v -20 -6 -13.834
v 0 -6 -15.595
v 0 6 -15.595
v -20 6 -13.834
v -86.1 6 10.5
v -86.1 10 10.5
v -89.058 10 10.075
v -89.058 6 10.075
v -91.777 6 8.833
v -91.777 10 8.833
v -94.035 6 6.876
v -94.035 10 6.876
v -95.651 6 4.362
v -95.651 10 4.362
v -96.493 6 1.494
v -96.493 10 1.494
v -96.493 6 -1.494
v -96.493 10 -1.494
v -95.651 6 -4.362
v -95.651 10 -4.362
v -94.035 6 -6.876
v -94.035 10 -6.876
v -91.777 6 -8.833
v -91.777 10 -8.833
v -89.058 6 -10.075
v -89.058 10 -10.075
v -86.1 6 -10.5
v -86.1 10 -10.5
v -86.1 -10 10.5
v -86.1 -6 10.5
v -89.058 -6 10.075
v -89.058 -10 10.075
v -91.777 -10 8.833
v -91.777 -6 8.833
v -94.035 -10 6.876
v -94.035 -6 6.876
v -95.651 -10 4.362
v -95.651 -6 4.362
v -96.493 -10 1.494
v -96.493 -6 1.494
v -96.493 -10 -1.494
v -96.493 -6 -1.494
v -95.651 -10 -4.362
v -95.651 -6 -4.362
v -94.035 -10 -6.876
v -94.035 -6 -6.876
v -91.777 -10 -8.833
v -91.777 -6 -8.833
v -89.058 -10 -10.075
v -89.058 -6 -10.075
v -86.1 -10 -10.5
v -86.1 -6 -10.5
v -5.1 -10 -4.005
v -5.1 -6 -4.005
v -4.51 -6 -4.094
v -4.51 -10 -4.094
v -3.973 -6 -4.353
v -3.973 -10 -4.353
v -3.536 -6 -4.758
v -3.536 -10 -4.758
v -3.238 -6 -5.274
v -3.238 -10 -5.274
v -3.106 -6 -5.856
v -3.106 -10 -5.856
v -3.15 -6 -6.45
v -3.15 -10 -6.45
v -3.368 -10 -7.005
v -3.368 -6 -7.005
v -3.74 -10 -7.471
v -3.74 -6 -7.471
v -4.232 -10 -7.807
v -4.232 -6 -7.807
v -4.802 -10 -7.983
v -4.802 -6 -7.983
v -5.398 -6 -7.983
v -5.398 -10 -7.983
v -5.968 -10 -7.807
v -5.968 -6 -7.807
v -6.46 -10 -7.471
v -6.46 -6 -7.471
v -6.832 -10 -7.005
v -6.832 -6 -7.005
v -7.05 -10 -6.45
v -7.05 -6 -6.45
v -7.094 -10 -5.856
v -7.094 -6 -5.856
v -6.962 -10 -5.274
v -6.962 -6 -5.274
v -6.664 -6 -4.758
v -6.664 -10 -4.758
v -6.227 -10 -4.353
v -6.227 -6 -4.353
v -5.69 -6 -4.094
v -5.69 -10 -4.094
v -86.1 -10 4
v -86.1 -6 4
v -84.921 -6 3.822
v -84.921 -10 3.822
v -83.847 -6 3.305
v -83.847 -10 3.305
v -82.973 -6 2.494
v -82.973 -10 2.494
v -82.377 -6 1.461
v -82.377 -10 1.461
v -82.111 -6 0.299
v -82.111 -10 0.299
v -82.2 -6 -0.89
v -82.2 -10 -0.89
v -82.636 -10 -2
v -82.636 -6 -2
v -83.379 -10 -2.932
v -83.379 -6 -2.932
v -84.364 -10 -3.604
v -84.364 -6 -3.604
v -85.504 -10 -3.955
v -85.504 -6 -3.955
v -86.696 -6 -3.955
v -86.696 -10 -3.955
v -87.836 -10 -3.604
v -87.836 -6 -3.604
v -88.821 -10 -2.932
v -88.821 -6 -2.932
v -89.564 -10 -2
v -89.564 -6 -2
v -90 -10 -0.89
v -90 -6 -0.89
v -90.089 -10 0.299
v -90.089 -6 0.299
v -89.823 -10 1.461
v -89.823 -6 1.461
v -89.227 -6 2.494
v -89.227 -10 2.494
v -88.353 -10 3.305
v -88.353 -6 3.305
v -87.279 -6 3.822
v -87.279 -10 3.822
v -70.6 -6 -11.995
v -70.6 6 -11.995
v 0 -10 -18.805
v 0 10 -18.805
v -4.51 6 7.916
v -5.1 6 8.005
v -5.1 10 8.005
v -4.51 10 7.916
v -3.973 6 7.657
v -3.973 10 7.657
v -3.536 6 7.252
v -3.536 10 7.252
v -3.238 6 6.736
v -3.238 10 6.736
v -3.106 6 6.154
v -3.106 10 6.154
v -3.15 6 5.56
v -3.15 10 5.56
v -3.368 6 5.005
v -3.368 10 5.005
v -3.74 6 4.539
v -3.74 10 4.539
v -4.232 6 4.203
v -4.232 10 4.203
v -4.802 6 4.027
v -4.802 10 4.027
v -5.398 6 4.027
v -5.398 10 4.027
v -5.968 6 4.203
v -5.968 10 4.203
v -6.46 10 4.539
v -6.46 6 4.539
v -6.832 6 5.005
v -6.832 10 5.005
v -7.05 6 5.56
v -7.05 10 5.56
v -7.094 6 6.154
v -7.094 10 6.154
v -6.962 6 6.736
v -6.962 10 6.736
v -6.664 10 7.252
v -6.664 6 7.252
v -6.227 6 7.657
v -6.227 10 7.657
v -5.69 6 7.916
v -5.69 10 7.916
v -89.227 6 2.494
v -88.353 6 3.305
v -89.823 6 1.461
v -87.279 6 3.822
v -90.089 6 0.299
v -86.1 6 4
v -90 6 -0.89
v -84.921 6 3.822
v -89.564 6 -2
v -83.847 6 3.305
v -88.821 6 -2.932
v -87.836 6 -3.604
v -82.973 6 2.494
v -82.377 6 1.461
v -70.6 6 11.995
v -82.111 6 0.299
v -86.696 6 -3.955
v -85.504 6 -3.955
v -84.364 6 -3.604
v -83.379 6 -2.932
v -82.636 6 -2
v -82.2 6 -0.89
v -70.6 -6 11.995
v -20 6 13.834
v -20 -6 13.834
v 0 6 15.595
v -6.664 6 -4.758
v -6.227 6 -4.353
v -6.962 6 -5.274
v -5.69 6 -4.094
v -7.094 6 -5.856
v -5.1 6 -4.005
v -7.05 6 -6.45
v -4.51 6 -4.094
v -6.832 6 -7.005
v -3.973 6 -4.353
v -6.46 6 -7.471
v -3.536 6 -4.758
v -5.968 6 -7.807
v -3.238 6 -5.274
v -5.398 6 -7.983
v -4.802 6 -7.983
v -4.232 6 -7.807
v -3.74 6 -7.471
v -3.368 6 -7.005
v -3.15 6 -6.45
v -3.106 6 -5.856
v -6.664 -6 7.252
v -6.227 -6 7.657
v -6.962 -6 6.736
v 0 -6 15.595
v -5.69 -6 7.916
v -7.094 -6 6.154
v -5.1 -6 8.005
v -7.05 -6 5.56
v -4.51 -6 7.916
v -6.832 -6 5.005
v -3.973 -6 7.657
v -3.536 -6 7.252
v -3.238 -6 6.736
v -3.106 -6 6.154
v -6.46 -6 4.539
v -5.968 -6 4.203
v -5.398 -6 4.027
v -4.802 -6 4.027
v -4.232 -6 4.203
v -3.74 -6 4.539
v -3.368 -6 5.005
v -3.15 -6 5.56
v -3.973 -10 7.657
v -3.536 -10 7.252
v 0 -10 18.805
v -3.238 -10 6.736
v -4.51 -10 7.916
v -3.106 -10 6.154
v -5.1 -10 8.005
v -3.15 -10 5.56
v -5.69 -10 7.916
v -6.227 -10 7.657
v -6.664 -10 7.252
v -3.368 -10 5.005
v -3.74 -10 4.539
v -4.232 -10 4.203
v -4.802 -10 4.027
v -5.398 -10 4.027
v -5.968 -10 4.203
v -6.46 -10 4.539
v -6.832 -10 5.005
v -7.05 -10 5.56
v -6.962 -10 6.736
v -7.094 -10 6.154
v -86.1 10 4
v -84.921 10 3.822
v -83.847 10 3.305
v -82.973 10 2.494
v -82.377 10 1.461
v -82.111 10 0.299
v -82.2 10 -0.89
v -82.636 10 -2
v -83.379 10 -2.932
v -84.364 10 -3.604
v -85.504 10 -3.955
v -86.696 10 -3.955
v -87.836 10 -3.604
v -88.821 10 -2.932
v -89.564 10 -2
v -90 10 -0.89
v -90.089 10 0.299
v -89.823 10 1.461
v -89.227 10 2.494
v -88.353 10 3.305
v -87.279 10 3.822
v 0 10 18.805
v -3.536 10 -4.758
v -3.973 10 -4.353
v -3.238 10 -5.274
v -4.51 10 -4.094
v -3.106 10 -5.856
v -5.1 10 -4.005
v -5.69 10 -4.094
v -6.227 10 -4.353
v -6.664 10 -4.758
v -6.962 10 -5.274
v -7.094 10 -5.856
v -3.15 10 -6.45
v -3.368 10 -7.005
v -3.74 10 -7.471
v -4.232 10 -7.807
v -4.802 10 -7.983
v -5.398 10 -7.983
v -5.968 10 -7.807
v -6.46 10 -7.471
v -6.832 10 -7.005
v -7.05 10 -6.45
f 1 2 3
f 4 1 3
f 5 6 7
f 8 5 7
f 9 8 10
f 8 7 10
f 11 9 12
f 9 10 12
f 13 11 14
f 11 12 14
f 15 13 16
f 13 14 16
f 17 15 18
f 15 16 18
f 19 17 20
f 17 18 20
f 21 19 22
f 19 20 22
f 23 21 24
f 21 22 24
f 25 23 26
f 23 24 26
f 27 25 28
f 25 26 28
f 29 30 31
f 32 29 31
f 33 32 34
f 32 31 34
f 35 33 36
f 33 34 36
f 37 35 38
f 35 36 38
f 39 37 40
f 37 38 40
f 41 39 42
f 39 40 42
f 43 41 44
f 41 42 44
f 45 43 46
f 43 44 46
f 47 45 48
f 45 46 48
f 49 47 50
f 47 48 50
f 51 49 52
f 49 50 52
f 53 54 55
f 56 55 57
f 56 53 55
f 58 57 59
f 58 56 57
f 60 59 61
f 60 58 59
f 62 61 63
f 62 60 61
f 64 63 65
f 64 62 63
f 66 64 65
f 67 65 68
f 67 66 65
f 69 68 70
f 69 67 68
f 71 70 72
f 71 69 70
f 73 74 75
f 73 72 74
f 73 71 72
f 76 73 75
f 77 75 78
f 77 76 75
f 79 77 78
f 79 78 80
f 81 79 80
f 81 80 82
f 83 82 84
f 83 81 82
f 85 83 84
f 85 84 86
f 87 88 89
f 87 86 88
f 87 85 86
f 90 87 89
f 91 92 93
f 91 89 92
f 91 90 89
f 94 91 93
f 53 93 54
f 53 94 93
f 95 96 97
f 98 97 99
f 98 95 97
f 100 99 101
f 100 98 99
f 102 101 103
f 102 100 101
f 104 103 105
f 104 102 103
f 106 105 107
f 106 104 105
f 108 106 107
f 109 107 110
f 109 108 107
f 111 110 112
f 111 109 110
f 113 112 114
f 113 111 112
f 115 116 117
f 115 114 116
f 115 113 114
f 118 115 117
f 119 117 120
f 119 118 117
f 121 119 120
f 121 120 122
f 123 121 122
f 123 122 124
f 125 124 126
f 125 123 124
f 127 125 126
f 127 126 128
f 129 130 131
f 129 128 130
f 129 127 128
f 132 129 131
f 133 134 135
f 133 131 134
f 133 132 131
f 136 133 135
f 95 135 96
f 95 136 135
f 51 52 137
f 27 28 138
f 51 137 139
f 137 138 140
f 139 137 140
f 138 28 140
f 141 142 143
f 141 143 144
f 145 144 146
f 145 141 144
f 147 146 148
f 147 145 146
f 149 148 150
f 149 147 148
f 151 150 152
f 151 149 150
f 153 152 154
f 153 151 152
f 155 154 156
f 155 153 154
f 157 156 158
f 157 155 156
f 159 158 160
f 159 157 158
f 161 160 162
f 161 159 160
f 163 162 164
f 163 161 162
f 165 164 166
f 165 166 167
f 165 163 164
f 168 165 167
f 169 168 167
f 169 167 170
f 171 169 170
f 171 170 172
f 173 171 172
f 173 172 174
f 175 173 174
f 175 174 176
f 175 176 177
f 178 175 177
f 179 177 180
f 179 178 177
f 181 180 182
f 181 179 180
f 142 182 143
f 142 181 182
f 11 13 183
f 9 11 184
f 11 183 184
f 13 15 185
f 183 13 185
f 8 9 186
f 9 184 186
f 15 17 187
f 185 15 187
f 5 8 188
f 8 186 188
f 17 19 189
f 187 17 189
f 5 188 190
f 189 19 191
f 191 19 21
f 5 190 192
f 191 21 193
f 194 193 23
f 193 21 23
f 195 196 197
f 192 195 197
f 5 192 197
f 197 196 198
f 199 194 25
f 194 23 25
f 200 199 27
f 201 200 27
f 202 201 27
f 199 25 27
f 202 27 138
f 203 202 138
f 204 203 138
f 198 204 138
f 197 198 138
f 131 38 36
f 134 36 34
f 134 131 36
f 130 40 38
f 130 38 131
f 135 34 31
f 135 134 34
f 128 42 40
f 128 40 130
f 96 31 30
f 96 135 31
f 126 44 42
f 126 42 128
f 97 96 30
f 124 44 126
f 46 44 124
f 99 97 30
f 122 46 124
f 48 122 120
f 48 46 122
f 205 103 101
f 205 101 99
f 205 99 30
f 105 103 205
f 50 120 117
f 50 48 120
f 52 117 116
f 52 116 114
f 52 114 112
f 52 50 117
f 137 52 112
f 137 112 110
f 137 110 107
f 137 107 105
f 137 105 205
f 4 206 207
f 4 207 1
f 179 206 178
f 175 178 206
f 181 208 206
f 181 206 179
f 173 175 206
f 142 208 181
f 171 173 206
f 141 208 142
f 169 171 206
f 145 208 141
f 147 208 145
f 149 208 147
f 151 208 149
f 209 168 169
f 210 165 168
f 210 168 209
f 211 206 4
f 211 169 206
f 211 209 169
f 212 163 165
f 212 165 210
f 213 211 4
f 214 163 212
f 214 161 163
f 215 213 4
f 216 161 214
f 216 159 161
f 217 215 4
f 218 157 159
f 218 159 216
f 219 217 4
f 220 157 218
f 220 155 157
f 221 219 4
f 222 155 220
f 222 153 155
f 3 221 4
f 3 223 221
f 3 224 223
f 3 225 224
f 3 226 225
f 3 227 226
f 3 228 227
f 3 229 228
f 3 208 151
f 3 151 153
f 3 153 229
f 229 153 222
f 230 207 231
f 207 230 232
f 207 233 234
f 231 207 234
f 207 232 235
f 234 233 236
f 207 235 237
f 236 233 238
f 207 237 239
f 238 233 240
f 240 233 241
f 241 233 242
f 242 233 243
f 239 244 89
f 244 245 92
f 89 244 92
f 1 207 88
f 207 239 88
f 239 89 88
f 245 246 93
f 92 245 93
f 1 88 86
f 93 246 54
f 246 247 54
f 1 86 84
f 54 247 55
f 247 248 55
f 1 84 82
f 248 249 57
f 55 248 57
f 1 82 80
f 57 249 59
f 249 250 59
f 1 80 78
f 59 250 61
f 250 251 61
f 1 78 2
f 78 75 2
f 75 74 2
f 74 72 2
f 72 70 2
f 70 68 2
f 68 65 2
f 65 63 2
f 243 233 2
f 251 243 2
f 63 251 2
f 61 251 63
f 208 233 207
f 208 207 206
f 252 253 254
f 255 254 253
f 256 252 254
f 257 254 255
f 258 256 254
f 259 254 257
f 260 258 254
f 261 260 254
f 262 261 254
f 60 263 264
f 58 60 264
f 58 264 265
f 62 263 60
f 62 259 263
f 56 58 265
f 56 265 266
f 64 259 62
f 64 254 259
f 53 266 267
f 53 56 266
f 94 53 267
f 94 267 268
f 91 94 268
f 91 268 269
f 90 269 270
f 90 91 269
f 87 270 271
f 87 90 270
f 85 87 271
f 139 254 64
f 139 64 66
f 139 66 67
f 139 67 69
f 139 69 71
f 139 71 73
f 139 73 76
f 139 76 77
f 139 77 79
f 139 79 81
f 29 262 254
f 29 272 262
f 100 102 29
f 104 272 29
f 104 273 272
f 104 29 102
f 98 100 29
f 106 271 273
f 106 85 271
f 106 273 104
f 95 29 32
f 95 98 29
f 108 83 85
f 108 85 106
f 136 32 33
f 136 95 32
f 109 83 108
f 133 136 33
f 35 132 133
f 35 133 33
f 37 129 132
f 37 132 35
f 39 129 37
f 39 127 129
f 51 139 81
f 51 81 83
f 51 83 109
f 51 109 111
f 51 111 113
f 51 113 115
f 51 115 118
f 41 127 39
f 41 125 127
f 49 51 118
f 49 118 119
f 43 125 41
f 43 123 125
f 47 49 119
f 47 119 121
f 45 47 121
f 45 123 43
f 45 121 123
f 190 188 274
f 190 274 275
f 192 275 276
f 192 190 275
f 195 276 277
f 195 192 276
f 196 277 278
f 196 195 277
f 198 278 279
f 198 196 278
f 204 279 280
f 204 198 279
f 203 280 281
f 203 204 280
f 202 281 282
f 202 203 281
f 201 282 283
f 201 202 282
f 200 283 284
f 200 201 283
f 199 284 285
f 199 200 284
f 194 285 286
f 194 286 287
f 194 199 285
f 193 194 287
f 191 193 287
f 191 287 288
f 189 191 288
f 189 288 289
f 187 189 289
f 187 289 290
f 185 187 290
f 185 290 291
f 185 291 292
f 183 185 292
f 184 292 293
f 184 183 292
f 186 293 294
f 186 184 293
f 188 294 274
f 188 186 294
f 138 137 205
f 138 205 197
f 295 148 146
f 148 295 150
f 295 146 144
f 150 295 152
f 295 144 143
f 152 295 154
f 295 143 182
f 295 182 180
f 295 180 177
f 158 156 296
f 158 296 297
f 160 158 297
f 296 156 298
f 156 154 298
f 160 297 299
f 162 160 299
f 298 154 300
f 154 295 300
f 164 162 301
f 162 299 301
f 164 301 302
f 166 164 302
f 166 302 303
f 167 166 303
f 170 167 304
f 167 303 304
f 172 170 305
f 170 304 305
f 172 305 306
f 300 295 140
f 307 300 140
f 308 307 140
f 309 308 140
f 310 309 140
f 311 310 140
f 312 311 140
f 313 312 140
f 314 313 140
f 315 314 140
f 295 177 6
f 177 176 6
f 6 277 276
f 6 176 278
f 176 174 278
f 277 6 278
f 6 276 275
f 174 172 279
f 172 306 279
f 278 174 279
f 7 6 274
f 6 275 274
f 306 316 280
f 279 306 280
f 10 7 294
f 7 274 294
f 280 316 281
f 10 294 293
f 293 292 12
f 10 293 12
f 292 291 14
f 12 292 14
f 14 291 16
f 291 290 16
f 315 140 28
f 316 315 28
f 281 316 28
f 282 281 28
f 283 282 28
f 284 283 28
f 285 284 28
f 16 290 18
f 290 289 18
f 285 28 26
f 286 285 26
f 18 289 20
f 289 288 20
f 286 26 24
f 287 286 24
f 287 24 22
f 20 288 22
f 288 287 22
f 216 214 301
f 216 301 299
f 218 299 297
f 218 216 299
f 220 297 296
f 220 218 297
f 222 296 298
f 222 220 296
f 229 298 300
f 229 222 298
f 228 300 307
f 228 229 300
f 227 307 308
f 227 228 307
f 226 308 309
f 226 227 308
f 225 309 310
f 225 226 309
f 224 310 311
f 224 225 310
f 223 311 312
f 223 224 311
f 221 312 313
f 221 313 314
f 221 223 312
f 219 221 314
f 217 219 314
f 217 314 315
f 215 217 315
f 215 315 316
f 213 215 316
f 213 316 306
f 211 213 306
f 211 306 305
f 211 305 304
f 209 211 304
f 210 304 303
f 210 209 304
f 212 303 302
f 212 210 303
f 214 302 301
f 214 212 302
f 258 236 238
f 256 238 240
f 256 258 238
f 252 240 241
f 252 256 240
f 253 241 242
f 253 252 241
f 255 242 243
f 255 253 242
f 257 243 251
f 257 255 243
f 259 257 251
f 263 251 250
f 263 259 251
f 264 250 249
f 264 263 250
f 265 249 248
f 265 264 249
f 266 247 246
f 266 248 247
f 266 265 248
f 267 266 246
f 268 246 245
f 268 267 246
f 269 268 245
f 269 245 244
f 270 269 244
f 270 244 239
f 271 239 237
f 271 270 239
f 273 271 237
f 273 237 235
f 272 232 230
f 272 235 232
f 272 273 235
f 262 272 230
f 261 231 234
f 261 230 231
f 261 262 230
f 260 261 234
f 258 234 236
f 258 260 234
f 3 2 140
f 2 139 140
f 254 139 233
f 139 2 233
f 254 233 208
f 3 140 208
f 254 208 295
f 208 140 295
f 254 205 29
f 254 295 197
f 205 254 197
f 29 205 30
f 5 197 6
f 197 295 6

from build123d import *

# Parameters (mm, degrees)
SKETCH1_R               = 4
SKETCH1_R_2             = 2
BOSS_EXTRUDE1_DEPTH     = 10
SKETCH3_W               = 31.19
SKETCH3_H               = 12
CUT_EXTRUDE1_DEPTH      = 20
DRAFT1_ANGLE            = 5.03318731
CUT_EXTRUDE2_DEPTH      = 99.920109305
CUT_EXTRUDE2_DEPTH_BACK = 99.920109305
SKETCH4_W               = 26
SKETCH4_H               = 12


with BuildPart() as part:
    # Sketch1 → Boss-Extrude1 (new, symmetric)
    with BuildSketch(Plane(origin=(0, 0, 0), x_dir=(1, 0, 0), z_dir=(0, 1, 0))):
        with BuildLine():
            Line((0, 18.805), (0, -18.805))
            Line((0, -18.805), (-86.1, -10.5))
            ThreePointArc((-86.1, -10.5), (-96.6, 0), (-86.1, 10.5))
            Line((-86.1, 10.5), (0, 18.805))
        make_face()
        with Locations(Location((-86.1, 0, 0), (0, 0, 270))):
            Circle(SKETCH1_R, mode=Mode.SUBTRACT)
        with Locations(Location((-5.1, 6.005, 0), (0, 0, 270))):
            Circle(SKETCH1_R_2, mode=Mode.SUBTRACT)
        with Locations(Location((-5.1, -6.005, 0), (0, 0, 270))):
            Circle(SKETCH1_R_2, mode=Mode.SUBTRACT)
    extrude(amount=BOSS_EXTRUDE1_DEPTH, both=True)

    # Sketch3 → Cut-Extrude1 (cut)
    with BuildSketch(Plane(origin=(0, 0, 0), x_dir=(0, 0, -1), z_dir=(1, 0, 0))):
        Rectangle(SKETCH3_W, SKETCH3_H)
    extrude(amount=-CUT_EXTRUDE1_DEPTH, mode=Mode.SUBTRACT)

    # Draft1
    draft1_faces = [part.faces().sort_by_distance(p)[0] for p in [
        (-10, 0, 15.595),
        (-10, 0, -15.595),
    ]]
    draft(draft1_faces, Plane(origin=(0, 10, -18.805), x_dir=(0, 0, 1), z_dir=(1, 0, 0)), DRAFT1_ANGLE)

    # Sketch4 → Cut-Extrude2 (cut, two sides: drawn at the far end of the back side and taken through both)
    with BuildSketch(Plane.XY.offset(-CUT_EXTRUDE2_DEPTH_BACK)):
        with Locations((-83.6, 0)):
            Rectangle(SKETCH4_W, SKETCH4_H)
    extrude(amount=CUT_EXTRUDE2_DEPTH + CUT_EXTRUDE2_DEPTH_BACK, mode=Mode.SUBTRACT)


solid = part.part
